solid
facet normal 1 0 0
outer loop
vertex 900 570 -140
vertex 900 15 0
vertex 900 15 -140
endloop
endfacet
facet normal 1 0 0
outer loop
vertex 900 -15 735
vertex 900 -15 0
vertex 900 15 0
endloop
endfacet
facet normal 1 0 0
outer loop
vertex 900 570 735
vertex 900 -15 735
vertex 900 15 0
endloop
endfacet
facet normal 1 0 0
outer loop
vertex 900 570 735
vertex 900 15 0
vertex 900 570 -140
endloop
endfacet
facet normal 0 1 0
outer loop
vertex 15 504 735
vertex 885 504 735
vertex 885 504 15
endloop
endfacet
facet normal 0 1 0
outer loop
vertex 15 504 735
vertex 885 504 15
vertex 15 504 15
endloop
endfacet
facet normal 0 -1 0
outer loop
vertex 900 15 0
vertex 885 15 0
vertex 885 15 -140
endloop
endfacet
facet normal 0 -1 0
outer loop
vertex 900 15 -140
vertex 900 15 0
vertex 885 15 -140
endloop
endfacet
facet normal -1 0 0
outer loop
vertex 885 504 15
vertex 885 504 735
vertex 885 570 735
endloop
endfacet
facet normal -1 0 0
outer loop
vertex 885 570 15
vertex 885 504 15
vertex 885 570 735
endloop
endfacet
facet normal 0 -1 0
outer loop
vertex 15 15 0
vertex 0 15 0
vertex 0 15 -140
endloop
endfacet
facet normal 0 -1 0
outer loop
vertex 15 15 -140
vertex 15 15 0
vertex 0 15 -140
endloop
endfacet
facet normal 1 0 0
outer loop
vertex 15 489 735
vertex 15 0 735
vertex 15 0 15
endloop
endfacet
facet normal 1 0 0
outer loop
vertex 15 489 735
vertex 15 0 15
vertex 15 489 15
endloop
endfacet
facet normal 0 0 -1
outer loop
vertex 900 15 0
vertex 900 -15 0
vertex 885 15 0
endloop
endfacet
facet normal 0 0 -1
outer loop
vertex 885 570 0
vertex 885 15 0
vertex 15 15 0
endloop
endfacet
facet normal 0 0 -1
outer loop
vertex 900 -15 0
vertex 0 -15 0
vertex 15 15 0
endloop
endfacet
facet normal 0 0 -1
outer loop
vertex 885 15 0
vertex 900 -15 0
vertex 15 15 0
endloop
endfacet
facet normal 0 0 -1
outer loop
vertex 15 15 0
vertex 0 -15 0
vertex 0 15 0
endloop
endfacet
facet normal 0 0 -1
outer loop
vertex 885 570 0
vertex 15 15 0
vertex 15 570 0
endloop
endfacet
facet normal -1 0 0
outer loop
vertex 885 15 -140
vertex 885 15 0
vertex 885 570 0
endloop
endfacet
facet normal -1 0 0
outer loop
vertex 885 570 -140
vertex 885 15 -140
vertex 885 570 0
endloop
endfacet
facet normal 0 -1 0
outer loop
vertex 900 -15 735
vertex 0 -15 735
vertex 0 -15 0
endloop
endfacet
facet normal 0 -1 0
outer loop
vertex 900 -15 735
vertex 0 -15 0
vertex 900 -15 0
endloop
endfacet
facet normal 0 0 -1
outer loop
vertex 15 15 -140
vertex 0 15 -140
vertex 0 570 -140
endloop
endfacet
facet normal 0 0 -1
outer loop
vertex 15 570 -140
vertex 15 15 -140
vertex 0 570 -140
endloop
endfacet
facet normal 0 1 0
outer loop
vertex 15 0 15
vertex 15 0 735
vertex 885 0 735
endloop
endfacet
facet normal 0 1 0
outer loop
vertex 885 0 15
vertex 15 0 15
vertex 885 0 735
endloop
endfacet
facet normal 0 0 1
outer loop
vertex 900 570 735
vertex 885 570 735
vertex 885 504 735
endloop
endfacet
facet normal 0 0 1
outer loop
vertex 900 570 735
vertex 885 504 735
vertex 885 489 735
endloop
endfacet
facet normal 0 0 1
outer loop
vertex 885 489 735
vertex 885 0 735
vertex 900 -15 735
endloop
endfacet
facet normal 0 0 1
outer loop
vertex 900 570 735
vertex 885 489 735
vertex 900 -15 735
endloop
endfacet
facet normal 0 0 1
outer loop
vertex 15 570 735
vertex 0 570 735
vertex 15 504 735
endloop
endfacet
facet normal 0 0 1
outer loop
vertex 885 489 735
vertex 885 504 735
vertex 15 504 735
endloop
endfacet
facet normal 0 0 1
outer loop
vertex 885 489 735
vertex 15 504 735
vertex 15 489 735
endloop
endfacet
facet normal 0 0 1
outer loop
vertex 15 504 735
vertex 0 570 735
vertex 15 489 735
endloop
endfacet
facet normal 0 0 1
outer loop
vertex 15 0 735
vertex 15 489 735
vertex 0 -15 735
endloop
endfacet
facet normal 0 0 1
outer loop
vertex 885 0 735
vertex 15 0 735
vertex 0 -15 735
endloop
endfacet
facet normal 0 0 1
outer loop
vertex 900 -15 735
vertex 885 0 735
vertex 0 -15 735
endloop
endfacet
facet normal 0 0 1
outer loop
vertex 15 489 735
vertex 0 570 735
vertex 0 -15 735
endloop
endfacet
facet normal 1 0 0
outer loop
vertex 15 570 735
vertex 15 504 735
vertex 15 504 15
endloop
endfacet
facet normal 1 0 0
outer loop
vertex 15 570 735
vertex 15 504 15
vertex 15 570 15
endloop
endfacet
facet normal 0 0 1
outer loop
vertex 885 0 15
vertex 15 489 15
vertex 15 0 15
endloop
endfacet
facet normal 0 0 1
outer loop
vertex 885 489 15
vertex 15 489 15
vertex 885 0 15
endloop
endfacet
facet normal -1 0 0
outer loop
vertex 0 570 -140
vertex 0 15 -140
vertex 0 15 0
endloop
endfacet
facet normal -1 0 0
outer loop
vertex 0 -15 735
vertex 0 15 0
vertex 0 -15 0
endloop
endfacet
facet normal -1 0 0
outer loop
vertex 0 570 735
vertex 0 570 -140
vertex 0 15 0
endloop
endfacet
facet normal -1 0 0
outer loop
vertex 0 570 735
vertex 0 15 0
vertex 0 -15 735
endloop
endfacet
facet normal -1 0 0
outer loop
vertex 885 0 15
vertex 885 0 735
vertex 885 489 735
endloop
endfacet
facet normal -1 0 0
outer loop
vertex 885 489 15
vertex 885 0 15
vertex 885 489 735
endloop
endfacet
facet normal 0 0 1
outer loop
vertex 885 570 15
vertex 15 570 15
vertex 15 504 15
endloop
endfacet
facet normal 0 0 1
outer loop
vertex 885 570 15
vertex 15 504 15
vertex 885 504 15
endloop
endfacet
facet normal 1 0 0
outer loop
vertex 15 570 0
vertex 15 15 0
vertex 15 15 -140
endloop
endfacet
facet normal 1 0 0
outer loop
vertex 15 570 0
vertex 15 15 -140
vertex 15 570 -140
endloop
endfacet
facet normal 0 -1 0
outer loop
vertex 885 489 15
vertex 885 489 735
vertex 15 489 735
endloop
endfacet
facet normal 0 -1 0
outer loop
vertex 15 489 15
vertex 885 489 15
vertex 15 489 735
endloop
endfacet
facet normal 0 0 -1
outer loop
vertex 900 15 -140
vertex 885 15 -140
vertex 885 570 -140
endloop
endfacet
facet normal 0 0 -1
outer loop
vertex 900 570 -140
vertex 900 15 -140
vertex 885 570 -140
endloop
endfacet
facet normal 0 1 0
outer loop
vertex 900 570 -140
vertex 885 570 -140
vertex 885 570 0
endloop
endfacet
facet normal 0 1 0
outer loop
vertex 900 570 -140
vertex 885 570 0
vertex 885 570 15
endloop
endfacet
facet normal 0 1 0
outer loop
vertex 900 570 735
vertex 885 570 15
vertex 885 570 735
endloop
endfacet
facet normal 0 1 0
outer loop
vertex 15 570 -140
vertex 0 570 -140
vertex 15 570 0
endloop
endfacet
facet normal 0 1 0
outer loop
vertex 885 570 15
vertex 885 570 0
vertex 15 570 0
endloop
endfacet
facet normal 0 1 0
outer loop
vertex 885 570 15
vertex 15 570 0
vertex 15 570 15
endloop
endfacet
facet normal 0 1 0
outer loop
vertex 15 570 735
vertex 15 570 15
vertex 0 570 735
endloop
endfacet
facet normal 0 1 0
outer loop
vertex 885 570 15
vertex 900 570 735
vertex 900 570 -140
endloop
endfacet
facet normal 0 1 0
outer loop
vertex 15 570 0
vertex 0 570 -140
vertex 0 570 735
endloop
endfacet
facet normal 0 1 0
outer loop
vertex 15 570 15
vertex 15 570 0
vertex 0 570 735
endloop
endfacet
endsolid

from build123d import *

# Parameters (mm, degrees)
F2_DEPTH  = 15
F1_W      = 885
F1_H      = 570
F3_DEPTH  = 15
F4_W      = 900
F4_H      = 735
F5_DEPTH  = 15
F8_DEPTH  = 15
F10_W     = 870
F10_H     = 720
F11_DEPTH = 15


with BuildPart() as f2:
    # F0 (on Right) → F2 (new body)
    with BuildSketch(Plane.YZ):
        Polygon((0, 735), (0, 0), (15, 0), (15, -140), (570, -140), (570, 0), (570, 735), align=None)
    extrude(amount=F2_DEPTH)

    # F1 (on Top) → F3 (join)
    with BuildSketch(Plane.XY):
        with Locations((442.5, 285)):
            Rectangle(F1_W, F1_H)
    extrude(amount=F3_DEPTH)

    # F4 (on Front) → F5 (join)
    with BuildSketch(Plane.XZ):
        with Locations((450, 367.5)):
            Rectangle(F4_W, F4_H)
    extrude(amount=F5_DEPTH)

    # F7 (on offset) → F8 (join)
    with BuildSketch(Plane.YZ.offset(885)):
        Polygon((0, 735), (0, 0), (15, 0), (15, -140), (570, -140), (570, 735), align=None)
    extrude(amount=F8_DEPTH)

    # F10 (on offset) → F11 (join)
    with BuildSketch(Plane(origin=(0, 504, 0), x_dir=(-1, 0, 0), z_dir=(0, 1, 0))):
        with Locations((-450, 375)):
            Rectangle(F10_W, F10_H)
    extrude(amount=-F11_DEPTH)


solid = f2.part
